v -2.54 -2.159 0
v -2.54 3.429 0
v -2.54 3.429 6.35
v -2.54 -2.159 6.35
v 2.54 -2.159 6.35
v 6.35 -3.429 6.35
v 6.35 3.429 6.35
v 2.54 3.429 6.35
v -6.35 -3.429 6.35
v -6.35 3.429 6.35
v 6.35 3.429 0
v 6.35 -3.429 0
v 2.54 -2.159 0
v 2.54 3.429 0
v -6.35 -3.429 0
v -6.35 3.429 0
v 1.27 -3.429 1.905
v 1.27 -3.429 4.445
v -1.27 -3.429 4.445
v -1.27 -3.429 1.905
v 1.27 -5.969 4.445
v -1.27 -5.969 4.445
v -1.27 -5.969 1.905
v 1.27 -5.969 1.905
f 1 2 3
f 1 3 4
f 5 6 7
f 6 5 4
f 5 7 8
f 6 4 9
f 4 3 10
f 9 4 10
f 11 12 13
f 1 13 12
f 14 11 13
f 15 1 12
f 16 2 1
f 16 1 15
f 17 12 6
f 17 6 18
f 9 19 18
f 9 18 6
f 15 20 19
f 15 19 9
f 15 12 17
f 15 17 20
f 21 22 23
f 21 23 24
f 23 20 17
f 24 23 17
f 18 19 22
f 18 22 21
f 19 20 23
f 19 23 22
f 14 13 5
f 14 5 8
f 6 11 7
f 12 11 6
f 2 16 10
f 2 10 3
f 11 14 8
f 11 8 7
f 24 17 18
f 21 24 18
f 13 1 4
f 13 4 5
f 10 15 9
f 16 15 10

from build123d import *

# Parameters (mm, degrees)
BOSS_EXTRUDE1_DEPTH = 6.35
SKETCH2_W           = 2.54
SKETCH2_H           = 2.54
BOSS_EXTRUDE2_DEPTH = 2.54


with BuildPart() as part:
    # Sketch1 → Boss-Extrude1 (new body)
    with BuildSketch(Plane.XY):
        Polygon((6.35, -3.429), (-6.35, -3.429), (-6.35, 3.429), (-2.54, 3.429), (-2.54, -2.159), (2.54, -2.159), (2.54, 3.429), (6.35, 3.429), align=None)
    extrude(amount=BOSS_EXTRUDE1_DEPTH)

    # Sketch2 → Boss-Extrude2 (add)
    with BuildSketch(Plane.XZ.offset(3.429)):
        with Locations((0, 3.175)):
            Rectangle(SKETCH2_W, SKETCH2_H)
    extrude(amount=BOSS_EXTRUDE2_DEPTH)


solid = part.part
